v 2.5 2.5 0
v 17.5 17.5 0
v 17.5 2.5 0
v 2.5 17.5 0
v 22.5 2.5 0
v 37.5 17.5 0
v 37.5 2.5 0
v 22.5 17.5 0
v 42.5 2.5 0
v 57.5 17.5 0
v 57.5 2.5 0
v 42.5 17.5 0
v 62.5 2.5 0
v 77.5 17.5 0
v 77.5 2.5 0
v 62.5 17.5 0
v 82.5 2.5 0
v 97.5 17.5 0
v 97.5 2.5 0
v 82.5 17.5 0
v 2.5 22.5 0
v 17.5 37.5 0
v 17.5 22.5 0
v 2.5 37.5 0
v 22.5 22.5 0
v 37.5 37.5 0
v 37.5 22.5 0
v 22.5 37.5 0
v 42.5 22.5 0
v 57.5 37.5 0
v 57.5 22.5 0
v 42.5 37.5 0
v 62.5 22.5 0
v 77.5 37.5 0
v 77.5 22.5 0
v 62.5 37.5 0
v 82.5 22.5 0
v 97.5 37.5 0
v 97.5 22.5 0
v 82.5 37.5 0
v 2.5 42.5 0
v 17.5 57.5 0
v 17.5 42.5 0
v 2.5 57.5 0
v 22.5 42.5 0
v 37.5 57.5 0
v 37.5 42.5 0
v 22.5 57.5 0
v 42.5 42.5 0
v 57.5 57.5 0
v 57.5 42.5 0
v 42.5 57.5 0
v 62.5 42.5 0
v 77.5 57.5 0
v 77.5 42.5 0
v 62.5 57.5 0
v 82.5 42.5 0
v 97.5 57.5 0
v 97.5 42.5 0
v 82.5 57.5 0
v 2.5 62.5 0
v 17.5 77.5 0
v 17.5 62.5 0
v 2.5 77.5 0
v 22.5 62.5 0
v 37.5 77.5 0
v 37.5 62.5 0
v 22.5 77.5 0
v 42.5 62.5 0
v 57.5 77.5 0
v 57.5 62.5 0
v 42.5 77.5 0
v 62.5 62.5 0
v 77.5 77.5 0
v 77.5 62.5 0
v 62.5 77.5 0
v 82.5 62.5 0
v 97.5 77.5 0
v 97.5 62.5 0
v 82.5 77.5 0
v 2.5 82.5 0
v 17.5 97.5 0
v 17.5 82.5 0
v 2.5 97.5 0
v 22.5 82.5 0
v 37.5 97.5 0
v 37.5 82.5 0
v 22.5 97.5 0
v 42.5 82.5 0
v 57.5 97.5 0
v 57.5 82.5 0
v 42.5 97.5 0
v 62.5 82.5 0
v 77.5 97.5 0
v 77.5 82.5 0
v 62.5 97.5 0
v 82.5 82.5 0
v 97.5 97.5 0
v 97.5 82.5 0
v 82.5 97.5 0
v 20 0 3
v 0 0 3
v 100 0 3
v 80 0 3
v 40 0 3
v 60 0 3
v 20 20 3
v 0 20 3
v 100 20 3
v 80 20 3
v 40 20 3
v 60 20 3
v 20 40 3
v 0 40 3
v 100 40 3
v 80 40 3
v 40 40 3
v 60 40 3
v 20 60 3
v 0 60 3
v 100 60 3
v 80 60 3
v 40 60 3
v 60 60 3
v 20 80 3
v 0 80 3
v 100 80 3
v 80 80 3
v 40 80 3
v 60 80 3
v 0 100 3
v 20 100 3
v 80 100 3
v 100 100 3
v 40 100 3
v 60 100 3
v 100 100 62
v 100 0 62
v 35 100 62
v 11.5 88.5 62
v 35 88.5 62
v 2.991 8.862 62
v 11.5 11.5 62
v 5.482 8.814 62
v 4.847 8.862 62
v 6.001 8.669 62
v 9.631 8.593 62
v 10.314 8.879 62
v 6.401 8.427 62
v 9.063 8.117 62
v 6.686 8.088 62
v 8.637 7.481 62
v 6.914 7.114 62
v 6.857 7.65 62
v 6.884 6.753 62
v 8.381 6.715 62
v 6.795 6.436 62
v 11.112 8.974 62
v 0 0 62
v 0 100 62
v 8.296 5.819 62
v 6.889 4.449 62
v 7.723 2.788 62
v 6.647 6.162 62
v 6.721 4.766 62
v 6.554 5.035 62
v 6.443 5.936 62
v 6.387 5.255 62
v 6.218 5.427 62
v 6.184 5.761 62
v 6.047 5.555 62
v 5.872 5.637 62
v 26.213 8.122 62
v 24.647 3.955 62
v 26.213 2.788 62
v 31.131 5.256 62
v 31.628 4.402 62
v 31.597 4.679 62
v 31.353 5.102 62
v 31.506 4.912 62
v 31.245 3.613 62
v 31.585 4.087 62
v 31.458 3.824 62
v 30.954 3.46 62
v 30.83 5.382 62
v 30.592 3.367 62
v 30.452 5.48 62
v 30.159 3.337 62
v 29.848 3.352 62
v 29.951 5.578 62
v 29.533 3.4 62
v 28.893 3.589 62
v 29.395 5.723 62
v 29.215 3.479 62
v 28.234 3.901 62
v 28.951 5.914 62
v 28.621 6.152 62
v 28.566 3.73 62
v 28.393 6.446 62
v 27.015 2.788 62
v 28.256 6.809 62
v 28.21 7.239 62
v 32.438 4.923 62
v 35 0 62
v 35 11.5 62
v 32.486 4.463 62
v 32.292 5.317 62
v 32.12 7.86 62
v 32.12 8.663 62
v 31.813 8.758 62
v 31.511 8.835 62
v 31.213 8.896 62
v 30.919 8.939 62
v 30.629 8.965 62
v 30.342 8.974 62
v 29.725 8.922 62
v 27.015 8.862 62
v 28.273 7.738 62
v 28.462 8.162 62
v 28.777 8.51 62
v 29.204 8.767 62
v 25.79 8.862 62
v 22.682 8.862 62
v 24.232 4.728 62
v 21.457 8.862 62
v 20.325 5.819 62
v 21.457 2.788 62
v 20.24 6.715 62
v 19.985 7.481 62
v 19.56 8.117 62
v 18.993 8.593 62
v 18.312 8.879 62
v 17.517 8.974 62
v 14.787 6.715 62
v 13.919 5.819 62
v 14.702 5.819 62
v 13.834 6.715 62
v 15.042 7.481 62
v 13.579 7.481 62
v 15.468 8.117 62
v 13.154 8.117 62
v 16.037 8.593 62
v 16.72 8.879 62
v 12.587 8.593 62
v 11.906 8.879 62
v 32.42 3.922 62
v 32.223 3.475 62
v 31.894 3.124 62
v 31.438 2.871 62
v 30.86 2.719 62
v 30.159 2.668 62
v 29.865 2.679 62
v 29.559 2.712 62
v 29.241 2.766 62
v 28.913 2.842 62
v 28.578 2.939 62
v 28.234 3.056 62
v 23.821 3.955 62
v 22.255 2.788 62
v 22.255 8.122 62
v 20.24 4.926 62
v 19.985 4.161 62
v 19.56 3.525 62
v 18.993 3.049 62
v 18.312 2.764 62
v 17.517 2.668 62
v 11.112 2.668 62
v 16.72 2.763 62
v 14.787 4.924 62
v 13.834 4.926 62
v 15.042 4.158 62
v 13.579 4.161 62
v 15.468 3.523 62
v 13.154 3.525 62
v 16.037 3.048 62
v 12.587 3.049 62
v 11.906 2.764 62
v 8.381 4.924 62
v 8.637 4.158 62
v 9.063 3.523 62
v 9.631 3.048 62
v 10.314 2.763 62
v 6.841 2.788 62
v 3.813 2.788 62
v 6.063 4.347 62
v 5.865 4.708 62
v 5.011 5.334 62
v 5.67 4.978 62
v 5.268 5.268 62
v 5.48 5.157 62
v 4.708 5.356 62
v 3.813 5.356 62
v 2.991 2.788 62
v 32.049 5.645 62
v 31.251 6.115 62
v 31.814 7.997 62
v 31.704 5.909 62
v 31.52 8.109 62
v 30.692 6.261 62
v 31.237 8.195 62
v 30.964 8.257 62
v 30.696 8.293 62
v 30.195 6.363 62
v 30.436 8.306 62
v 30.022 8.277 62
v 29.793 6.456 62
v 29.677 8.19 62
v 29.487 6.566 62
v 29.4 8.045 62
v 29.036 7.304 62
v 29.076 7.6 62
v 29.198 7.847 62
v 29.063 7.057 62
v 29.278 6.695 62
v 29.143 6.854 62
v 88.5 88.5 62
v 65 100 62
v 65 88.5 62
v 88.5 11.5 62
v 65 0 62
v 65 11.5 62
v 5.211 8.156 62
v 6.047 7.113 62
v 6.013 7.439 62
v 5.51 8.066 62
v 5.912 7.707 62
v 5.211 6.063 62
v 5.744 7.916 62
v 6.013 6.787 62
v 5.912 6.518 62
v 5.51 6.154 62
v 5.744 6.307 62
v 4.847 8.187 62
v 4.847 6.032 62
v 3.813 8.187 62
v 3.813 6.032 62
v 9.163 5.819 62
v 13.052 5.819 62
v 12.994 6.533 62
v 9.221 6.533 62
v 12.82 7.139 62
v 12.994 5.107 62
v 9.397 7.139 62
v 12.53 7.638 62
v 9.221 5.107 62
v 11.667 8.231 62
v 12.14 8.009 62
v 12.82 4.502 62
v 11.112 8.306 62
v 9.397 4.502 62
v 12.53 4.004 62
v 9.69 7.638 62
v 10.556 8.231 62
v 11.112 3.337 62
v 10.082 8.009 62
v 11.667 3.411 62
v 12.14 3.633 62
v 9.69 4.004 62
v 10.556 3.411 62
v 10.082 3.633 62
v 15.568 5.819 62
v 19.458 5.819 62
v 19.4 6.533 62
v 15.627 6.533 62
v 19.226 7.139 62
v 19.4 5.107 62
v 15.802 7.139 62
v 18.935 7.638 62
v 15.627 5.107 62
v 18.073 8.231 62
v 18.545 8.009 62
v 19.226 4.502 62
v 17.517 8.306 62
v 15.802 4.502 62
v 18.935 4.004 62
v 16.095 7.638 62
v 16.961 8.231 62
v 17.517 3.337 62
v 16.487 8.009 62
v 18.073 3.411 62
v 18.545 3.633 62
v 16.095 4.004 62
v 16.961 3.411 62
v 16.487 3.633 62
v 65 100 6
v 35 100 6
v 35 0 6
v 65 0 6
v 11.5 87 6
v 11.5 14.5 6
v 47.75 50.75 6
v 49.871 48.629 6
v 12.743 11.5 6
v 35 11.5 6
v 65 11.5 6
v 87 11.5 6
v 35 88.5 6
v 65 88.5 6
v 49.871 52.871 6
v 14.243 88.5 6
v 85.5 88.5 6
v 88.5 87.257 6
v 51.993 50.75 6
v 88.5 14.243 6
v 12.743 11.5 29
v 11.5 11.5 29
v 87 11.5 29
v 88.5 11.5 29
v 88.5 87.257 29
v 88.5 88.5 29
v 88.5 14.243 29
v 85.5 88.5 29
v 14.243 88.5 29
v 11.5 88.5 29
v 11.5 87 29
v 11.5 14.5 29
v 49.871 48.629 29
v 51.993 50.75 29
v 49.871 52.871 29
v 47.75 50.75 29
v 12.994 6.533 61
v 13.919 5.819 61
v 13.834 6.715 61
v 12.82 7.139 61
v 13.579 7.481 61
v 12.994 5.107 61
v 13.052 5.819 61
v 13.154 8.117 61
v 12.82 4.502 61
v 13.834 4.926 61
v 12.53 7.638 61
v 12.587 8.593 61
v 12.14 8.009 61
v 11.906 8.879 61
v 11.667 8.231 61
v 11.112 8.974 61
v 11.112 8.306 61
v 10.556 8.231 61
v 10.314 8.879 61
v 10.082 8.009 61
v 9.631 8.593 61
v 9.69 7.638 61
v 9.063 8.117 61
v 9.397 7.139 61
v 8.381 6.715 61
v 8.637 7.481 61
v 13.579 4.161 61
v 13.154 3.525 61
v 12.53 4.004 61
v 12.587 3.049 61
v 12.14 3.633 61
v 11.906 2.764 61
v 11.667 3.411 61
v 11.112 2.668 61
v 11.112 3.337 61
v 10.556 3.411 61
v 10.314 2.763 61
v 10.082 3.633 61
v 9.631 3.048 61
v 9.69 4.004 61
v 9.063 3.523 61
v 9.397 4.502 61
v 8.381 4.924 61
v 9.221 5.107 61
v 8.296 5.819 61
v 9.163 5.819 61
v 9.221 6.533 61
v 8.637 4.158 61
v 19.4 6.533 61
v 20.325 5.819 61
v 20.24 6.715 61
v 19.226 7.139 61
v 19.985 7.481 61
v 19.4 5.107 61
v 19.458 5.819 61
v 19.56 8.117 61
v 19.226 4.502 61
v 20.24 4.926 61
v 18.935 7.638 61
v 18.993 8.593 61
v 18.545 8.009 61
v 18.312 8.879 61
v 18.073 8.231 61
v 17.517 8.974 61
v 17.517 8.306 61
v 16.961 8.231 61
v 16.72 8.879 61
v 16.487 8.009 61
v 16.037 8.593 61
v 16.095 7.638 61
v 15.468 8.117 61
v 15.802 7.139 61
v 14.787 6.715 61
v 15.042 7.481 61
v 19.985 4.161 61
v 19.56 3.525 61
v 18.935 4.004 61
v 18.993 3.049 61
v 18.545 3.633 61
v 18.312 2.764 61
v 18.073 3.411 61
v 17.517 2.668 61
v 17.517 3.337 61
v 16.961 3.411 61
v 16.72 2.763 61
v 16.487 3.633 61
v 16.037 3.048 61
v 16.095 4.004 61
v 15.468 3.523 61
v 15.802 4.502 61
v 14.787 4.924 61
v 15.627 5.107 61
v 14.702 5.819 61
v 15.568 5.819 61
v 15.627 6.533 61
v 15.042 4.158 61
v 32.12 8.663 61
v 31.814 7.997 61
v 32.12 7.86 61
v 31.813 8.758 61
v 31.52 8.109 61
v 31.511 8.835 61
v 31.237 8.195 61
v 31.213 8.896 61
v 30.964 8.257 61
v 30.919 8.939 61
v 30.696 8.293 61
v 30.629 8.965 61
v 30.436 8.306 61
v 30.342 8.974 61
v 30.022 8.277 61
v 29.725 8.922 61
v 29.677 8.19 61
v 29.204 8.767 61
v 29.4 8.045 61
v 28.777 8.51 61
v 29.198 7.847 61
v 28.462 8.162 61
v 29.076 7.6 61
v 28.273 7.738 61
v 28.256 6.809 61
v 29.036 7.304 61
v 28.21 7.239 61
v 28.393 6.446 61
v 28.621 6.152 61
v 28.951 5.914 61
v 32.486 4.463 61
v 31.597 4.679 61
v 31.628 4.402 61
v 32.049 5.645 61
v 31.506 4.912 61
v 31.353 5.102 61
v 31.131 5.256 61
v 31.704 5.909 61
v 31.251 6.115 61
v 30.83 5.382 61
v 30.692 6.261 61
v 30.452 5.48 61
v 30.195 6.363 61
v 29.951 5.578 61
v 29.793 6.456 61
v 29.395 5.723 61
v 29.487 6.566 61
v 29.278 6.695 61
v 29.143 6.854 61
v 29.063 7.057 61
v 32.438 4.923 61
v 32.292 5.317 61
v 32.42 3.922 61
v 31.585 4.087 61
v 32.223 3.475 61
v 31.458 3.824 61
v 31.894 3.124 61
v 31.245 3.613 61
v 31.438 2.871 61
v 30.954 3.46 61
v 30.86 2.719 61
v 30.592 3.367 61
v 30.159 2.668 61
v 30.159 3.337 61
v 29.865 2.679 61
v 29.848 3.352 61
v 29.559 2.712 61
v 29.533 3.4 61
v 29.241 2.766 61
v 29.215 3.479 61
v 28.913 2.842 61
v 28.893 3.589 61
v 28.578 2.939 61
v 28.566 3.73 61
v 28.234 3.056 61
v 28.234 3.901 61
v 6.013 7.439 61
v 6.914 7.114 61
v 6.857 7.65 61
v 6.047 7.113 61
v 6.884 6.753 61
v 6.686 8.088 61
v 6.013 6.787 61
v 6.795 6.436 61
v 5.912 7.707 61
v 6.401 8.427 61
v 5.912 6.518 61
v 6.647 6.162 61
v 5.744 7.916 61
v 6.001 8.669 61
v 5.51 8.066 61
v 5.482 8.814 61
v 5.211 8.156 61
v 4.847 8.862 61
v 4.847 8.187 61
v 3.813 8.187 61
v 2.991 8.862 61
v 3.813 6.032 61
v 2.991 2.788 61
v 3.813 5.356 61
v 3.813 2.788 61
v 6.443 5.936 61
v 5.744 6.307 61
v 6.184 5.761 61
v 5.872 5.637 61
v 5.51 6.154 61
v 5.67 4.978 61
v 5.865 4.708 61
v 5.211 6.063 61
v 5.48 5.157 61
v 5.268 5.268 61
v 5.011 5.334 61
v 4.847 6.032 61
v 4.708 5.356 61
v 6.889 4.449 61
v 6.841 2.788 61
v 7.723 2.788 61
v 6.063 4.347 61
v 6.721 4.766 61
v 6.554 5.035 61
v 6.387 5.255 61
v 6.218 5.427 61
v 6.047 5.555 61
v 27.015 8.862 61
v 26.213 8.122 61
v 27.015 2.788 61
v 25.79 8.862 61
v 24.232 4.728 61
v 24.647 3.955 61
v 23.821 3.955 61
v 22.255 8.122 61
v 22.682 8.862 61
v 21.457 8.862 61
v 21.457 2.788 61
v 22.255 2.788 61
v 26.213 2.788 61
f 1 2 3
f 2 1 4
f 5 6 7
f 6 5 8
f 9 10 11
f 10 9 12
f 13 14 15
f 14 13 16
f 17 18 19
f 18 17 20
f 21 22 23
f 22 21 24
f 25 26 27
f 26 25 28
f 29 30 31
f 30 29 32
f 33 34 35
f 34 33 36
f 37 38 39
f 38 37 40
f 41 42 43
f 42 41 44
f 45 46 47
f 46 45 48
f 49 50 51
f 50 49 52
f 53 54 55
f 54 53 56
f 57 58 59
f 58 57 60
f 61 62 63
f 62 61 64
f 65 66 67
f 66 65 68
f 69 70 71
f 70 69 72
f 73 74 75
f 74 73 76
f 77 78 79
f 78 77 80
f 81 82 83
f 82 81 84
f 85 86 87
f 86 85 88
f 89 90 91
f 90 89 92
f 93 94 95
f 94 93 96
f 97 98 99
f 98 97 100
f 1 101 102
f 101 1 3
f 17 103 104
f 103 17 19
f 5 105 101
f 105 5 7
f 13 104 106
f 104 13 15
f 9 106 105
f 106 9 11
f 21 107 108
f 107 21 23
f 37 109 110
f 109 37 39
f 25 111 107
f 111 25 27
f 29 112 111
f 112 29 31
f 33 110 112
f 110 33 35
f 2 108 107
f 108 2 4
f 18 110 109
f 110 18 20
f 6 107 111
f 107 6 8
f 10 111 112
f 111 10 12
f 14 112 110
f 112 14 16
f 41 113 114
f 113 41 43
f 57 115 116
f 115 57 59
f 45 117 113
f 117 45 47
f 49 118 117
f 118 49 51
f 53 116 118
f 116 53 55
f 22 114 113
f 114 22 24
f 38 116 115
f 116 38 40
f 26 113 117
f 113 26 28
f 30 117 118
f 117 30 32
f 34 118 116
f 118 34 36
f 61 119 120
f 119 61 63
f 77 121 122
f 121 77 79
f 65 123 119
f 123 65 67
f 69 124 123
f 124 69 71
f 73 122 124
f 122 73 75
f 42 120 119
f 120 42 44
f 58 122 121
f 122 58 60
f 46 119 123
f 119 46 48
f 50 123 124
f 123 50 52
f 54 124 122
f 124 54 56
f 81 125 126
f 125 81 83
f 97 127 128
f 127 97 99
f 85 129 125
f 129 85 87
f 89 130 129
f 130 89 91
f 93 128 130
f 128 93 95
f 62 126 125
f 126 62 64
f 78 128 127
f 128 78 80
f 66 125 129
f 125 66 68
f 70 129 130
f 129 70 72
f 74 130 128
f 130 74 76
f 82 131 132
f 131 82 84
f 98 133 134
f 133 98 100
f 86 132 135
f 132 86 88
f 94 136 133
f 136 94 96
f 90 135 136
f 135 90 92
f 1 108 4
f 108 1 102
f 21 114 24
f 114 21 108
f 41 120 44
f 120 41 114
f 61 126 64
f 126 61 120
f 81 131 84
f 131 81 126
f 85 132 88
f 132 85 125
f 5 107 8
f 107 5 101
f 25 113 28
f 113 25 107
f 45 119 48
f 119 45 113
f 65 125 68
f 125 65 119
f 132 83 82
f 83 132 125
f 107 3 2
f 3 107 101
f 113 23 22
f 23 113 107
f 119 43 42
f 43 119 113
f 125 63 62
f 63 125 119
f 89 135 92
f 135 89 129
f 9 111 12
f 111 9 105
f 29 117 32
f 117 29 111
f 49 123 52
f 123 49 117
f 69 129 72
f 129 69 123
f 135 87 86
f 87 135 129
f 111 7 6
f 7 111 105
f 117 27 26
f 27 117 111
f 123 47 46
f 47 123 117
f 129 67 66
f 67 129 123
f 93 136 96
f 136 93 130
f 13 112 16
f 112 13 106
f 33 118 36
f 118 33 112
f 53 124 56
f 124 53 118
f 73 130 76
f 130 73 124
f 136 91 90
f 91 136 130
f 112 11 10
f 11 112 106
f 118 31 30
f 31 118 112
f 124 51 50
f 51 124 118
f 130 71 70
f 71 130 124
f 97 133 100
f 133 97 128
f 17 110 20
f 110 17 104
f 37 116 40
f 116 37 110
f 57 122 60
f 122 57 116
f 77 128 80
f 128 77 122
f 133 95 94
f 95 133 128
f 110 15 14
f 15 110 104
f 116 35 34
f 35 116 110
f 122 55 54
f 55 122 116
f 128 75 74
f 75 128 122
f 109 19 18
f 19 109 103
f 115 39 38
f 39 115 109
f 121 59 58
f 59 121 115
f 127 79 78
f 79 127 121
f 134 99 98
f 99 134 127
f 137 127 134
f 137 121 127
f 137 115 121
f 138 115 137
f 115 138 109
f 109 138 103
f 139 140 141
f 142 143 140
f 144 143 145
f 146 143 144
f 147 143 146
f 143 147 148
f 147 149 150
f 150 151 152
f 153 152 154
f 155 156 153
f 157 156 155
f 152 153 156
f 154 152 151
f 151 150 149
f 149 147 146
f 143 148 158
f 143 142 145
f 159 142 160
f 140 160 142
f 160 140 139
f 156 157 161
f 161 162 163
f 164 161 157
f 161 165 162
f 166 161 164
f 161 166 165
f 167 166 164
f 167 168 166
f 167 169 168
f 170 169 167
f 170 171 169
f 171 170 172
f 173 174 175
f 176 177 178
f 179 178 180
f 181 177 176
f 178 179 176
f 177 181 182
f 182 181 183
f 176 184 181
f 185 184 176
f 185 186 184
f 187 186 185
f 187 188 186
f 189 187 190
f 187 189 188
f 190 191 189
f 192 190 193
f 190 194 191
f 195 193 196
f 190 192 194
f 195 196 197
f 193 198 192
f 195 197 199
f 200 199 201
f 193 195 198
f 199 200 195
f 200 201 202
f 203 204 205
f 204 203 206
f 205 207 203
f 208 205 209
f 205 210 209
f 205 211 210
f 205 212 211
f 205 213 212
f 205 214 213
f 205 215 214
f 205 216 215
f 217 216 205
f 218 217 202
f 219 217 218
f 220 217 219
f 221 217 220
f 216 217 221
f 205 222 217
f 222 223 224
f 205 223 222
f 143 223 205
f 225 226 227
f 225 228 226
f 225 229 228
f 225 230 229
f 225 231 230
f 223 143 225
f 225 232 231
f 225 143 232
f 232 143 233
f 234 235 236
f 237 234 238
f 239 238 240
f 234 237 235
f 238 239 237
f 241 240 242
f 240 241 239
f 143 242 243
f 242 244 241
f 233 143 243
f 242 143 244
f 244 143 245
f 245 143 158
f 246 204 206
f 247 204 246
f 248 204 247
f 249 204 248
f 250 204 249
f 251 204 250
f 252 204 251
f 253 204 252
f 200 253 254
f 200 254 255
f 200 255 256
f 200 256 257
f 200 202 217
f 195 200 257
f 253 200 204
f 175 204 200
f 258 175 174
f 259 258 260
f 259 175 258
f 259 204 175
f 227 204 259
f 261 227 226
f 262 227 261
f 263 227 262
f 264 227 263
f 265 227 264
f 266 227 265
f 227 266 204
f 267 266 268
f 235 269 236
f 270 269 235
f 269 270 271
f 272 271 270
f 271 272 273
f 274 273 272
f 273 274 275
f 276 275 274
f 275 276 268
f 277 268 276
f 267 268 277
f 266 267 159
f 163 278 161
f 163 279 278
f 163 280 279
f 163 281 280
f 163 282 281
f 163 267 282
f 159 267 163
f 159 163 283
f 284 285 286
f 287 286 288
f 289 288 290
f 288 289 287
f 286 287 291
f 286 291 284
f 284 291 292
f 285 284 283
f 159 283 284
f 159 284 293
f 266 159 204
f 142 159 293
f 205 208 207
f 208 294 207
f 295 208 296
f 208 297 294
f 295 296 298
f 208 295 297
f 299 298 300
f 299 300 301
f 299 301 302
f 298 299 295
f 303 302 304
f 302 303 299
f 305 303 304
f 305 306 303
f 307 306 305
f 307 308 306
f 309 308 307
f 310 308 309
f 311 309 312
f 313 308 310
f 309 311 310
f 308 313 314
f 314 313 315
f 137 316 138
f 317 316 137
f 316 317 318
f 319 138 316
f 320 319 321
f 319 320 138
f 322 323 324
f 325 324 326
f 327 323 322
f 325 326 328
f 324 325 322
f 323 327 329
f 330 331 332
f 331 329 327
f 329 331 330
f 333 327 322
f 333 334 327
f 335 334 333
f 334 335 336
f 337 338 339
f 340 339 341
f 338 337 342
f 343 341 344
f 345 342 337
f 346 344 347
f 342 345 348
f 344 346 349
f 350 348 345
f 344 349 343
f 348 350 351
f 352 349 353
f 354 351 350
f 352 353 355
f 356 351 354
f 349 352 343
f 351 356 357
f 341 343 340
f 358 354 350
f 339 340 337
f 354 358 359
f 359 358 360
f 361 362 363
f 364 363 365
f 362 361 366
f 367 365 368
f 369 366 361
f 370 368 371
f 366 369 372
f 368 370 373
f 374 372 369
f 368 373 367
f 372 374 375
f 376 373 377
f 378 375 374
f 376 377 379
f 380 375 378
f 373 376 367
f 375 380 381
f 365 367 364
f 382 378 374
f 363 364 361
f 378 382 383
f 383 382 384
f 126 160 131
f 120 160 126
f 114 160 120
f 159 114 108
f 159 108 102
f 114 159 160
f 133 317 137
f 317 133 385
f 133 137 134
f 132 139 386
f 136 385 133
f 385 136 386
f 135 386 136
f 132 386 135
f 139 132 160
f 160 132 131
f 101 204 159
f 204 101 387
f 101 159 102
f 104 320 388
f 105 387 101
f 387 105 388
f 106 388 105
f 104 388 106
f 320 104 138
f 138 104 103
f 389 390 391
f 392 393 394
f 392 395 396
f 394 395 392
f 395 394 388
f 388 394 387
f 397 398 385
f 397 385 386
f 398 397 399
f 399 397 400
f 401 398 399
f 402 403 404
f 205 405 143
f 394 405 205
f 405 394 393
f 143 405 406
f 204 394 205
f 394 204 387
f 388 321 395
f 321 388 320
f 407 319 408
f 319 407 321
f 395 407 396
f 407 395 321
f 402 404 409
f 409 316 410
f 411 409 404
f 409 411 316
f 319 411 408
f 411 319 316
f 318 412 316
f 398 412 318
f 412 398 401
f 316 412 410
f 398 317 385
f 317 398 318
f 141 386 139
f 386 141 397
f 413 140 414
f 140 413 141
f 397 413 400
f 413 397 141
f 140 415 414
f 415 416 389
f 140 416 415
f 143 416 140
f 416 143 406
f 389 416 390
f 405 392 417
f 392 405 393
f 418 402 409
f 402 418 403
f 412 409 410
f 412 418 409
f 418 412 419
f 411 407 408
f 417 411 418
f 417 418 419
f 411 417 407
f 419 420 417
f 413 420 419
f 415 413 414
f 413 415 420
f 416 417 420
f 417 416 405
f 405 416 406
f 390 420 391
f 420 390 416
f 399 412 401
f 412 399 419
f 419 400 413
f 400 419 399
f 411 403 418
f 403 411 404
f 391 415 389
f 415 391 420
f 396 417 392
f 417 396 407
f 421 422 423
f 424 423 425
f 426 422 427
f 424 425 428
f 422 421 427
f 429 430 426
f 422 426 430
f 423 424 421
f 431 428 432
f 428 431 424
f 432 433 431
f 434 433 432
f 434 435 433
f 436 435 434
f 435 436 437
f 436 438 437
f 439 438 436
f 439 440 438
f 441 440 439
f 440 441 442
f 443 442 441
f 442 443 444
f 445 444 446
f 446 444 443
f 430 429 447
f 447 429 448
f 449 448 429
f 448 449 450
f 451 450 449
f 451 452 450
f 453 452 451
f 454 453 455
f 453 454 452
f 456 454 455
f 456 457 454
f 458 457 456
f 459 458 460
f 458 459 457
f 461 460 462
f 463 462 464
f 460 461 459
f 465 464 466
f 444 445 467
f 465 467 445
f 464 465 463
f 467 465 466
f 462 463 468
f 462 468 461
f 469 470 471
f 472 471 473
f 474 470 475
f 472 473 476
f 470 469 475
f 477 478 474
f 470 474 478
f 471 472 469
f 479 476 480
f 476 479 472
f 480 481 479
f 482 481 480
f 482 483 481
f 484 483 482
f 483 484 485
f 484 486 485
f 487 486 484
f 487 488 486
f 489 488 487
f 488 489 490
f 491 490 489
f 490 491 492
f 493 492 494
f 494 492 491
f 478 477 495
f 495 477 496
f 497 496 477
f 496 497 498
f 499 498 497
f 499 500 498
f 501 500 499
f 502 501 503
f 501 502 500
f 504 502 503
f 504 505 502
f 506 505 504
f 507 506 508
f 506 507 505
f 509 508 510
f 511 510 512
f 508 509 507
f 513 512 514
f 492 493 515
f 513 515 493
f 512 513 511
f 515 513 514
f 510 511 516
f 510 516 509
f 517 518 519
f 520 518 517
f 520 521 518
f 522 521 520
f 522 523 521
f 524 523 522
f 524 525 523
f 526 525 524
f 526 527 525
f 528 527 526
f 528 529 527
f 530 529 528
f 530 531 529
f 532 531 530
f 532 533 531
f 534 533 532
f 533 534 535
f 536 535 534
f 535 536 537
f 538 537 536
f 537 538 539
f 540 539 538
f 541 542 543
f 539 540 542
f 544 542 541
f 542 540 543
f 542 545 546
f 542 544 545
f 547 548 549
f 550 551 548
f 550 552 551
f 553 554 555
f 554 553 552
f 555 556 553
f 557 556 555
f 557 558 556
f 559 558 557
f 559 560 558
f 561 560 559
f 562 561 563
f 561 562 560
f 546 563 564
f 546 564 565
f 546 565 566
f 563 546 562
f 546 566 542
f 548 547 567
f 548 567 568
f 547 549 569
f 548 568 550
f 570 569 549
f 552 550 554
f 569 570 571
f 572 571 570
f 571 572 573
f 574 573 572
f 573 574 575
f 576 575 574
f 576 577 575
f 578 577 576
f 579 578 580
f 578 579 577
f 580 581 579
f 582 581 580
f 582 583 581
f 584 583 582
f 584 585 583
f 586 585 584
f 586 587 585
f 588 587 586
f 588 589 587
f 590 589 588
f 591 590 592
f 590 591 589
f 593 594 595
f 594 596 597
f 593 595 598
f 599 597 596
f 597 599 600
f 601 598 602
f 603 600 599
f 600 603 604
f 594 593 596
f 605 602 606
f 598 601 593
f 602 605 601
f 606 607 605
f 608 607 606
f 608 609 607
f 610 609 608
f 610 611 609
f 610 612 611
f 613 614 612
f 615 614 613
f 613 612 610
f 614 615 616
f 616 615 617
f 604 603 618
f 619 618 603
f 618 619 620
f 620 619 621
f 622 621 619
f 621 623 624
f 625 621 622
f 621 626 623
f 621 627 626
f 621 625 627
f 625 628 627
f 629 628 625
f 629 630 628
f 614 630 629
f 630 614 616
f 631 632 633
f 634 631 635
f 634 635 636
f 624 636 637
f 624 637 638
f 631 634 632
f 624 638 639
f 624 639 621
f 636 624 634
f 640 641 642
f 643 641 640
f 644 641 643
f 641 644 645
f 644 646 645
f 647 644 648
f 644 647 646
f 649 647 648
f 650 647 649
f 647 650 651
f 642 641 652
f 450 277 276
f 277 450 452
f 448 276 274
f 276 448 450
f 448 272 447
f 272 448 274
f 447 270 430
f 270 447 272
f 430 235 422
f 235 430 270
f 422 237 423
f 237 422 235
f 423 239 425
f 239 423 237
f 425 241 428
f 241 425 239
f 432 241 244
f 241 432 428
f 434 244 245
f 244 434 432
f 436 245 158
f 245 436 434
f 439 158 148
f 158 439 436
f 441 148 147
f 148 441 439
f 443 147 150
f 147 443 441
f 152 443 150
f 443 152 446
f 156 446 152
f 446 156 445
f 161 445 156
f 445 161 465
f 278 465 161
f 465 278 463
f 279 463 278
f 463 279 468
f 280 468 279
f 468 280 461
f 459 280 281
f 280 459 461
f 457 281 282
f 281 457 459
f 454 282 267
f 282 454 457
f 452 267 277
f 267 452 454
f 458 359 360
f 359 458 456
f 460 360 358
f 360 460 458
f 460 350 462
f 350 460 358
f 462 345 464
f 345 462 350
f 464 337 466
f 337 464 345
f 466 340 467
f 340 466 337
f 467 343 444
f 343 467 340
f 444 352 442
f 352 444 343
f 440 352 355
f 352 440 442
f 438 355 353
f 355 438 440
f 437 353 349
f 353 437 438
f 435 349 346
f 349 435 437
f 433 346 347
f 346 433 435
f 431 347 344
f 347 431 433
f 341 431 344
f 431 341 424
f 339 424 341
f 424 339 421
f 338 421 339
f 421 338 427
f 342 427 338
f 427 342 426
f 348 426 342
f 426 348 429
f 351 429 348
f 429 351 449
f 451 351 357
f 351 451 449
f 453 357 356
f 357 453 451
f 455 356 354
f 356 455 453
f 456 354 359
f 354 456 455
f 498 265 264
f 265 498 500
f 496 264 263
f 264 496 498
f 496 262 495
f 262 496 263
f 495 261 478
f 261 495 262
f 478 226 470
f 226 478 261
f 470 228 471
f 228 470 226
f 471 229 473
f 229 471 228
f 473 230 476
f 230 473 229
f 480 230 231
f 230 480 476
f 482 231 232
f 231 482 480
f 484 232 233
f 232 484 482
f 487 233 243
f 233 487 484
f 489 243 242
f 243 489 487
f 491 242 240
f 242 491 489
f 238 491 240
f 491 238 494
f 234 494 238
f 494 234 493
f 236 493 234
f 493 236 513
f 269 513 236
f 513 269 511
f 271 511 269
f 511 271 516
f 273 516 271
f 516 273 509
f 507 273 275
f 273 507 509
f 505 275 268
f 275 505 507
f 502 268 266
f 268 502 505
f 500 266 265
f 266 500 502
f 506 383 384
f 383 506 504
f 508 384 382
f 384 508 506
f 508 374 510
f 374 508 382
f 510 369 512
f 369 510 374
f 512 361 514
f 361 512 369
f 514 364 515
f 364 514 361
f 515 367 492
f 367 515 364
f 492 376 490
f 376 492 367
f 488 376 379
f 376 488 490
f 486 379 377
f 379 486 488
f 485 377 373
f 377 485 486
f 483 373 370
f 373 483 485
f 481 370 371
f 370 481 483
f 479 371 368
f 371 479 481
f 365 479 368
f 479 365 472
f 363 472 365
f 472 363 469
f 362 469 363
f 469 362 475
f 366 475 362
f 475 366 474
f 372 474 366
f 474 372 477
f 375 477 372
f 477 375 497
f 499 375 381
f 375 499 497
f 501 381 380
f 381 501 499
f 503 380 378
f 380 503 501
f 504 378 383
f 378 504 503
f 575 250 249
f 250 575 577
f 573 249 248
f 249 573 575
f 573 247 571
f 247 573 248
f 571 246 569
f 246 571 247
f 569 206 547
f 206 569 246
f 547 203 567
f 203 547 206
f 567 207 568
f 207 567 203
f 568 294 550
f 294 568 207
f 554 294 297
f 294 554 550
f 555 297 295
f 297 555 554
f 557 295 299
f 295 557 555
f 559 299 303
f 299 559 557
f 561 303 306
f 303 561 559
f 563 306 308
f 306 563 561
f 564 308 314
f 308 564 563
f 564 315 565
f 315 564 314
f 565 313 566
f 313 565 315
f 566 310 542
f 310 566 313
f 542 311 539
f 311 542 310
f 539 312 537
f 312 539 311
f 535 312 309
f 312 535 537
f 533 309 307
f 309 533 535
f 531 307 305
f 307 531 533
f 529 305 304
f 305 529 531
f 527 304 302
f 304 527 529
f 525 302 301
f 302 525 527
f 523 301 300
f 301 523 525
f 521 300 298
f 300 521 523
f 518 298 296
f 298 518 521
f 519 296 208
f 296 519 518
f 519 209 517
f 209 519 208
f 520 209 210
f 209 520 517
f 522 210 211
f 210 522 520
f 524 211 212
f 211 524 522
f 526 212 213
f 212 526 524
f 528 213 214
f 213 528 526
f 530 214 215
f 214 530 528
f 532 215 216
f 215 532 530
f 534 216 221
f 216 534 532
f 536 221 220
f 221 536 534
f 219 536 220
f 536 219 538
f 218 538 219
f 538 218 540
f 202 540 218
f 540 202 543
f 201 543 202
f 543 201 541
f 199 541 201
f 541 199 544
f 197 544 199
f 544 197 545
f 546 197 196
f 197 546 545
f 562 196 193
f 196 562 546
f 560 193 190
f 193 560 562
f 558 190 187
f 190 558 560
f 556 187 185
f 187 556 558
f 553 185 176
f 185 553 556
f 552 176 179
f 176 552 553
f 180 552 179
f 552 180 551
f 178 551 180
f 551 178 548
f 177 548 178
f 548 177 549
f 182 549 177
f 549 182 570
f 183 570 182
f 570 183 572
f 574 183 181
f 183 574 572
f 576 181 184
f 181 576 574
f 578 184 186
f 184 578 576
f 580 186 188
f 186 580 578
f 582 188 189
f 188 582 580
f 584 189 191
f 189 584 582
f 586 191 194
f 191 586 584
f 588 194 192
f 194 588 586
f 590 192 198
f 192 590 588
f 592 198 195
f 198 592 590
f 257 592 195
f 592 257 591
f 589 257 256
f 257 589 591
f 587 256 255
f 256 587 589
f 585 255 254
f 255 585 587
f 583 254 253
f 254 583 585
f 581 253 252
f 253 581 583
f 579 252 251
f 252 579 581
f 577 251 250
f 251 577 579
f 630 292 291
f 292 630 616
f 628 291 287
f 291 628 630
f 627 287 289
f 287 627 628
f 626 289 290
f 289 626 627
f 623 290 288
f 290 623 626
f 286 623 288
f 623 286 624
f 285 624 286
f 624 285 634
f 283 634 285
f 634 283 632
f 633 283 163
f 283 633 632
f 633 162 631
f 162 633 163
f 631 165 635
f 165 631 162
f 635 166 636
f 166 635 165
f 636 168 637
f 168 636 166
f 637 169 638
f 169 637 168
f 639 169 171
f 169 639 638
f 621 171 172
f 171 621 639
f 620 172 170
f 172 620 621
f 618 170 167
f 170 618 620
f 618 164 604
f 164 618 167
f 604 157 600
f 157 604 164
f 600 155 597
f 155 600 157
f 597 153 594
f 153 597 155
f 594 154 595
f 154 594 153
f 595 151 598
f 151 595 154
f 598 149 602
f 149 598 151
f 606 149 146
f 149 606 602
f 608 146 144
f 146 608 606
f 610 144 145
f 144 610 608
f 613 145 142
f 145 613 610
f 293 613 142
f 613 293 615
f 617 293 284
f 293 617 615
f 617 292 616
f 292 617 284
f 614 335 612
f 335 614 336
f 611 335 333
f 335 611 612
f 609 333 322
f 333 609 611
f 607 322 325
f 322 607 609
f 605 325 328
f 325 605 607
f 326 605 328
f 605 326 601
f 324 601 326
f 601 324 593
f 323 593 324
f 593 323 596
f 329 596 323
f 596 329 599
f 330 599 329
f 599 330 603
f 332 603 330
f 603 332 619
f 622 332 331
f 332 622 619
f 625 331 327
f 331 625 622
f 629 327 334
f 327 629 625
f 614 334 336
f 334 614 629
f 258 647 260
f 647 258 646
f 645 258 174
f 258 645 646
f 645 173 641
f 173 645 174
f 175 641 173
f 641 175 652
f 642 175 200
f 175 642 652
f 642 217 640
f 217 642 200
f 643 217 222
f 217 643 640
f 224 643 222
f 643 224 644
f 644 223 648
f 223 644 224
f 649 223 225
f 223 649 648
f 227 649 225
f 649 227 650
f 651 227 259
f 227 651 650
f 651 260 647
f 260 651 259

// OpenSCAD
// file: ../chip_holder.scad
use <common.scad>

MAX_THUMB_WIDTH = 30;
WAY_DEEP = 100;

render_helper = 1;

module generate_holder(
    tile_columns = 4,
    tile_rows = 2,
    tile_width = 33,
    tile_depth = 33,
    tile_count = 20,
    tile_height = 1.75,
    wall_width = 3,
    box_height = 69,
    box_clearence = 15.75,
    round_to_full_base = true,
    fit_to_box_height = true,
    hollow_bottom = false,
    include_grid = true
) {
    function getSize(count, tile_size) = count * (tile_size + wall_width) + wall_width;
    function roundFullBase(count, tile_size) = (round_to_full_base) ? ceil(getSize(count, tile_size) / base_tile_size()) * base_tile_size() : getSize(count, tile_size);
    function max_height() = box_height - box_clearence;

    slot_height = tile_count * tile_height;
    min_floor_offset = min_floor_offset(wall_width);
    min_height = slot_height + min_floor_offset;
    total_height = (fit_to_box_height) ? max(max_height(), min_height) : min_height;
    inside_height = (hollow_bottom) ? total_height - min_floor_offset : slot_height;
    floor_offset = (fit_to_box_height) ? max_height() - inside_height : min_floor_offset;

    total_width = roundFullBase(tile_columns, tile_width);
    total_depth = roundFullBase(tile_rows, tile_depth);

    row_width = tile_depth * tile_rows;
    col_width = tile_width * tile_columns;
    outside_walls = wall_width * 2;

    col_spread = (tile_columns > 1) ? (total_width - col_width - outside_walls) / (tile_columns - 1) : 0;
    row_spread = (tile_rows > 1) ? (total_depth - row_width - outside_walls) / (tile_rows - 1) : 0;
    
    thumb_width = min(tile_width - (wall_width * 2), MAX_THUMB_WIDTH);

    function colOffset(i) = (tile_columns == 1) ?
        (total_width - tile_width) / 2 :
        wall_width + ((tile_width + col_spread) * i);
    function rowOffset(i) = (tile_rows == 1) ?
        (total_depth - tile_depth) / 2 :
        wall_width + ((tile_depth + row_spread) * i);

    module tile_slot() {
        translate([0, 0, 0])
        square([tile_width, tile_depth]);
    }

    module thumb_slot_front() {
        width = thumb_width;
        side_offset = (tile_width - width) / 2;
        translate([side_offset, -WAY_DEEP, 0])
        square([width, WAY_DEEP]);
    }

    module thumb_slot_back() {
        width = thumb_width;
        side_offset = (tile_width - width) / 2;
        translate([side_offset, tile_depth, 0])
        square([width, WAY_DEEP]);
    }

    module tile_hole(slot_type = "none") {
        box_bottom = floor_offset;
        translate([0, 0, box_bottom])
        linear_extrude(height = inside_height + render_helper)
        union() {
            tile_slot();
            if (slot_type == "front" || slot_type == "both") {
                thumb_slot_front();
            }

            if (slot_type == "back" || slot_type == "both") {
                thumb_slot_back();
            }
        }
    }

    module tile_holes() {
        for (i = [0 : tile_rows - 1]) {
            for (j = [0 : tile_columns - 1]) {
                slot_type = (tile_rows == 1) ? "both" : (i == 0) ? "front" : (i == tile_rows - 1) ? "back" : "none";
                col_offset = colOffset(j);
                row_offset = rowOffset(i);

                translate([col_offset, row_offset, 0])
                tile_hole(slot_type = slot_type);
            }
        }
    }

    module bottom_x() {
        if (hollow_bottom) {
            for (i = [0 : tile_rows - 1]) {
                for (j = [0 : tile_columns - 1]) {
                    length = sqrt(pow(tile_width, 2) + pow(tile_depth, 2));
                    rot = acos(tile_depth / length);
                    x_height = inside_height - slot_height;
                    z_offset = min_floor_offset(wall_width);

                    col_offset = colOffset(j);
                    row_offset = rowOffset(i);

                    translate([col_offset - wall_width / 2, row_offset + wall_width / 2, z_offset])
                    rotate([0, 0, -rot])
                    cube([wall_width, length + wall_width, x_height]);

                    translate([col_offset + tile_width, row_offset - wall_width / 2, z_offset])
                    rotate([0, 0, rot])
                    cube([wall_width, length + wall_width, x_height]);
                }
            }
        }
    }

    difference() {
        union() {
            difference() {
                base_block(total_width, total_depth, total_height, include_grid = include_grid);
                tile_holes();
            }
            bottom_x();
        }

        if ($children) {
            text_offset_x = (colOffset(0) + (tile_width - thumb_width) / 2) / 2;
            text_offset_y = rowOffset(0) / 2;
            
            translate([text_offset_x, text_offset_y, total_height])
            children(0);
        }
    }
}
// file: common.scad
WALL_WIDTH = 3;
BOX_HEIGHT = 75;
BOX_CLEARENCE = 13;
TILE_HEIGHT = 1.75;

FONT_SIZE = 8;

function wall_width() = WALL_WIDTH;
function box_height() = BOX_HEIGHT;
function box_clearence() = BOX_CLEARENCE;
function tile_height() = TILE_HEIGHT;
function font_size() = FONT_SIZE;
// file: ../common.scad
BASE_TILE_SIZE=20;
BASE_WIDTH=5;
PEAK_HEIGHT=3;

DEFAULT_FONT = "Ubuntu:style=Medium";
DEFAULT_FONT_DEPTH = 1;
DEFAULT_FONT_SIZE = 10;

render_helper_h = 1;

function y_up() = [90, 0, 0];
function x_up() = [90, 0, 90];

function min_floor_offset(wall_width) = wall_width + PEAK_HEIGHT;
function tri_mid() = BASE_WIDTH / 2;
function triangle() = [[0, 0],[BASE_WIDTH, 0],[tri_mid(), PEAK_HEIGHT]];
function base_tile_size() = BASE_TILE_SIZE;
function peak_height() = PEAK_HEIGHT;
function font_depth() = DEFAULT_FONT_DEPTH;
function font_size() = DEFAULT_FONT_SIZE;

function isX(direction) = (direction == "x");

module grid(width, depth, direction) {
    length = isX(direction) ? width : depth;
    slot_length = isX(direction) ? depth : width;
    translate_z = isX(direction) ? -slot_length : 0;
    rot = isX(direction) ? y_up() : x_up();

    // This is the total additional slots past the initial one
    total_slots = floor(length / BASE_TILE_SIZE);

    for (i = [0 : total_slots]) {
        offset = -tri_mid() + BASE_TILE_SIZE * i;
        rotate(rot)
        translate([offset, 0, translate_z])
        linear_extrude(height = slot_length)
        polygon(points=triangle());
    }
}

module grid_slots(width, depth) {
    grid(width, depth, "y");
    grid(width, depth, "x");
}

module base_block(width, depth, height, include_grid = true) {
    difference() {
        cube([width, depth, height]);

        if (include_grid) {
            grid_slots(width, depth);
        }
    }
}

module prism(l, w, h) {
    polyhedron(
        points=[ [0, 0, 0], [0, w, h], [l, w, h], [l, 0, 0], [0, w, 0], [l, w, 0] ],
        faces=[ [0, 1, 2, 3],
            [2, 1, 4, 5],
            [0, 3, 5, 4],
            [0, 4, 1],
            [3, 2, 5]
        ]
    );
}

module pyramid(w) {
    polyhedron(
        points=[ [w,w,0],[w,-w,0],[-w,-w,0],[-w,w,0], [0,0,w]  ],
        faces=[ [0,1,4],[1,2,4],[2,3,4],[3,0,4], [1,0,3],[2,1,3] ]
    );
}

module embossed_text(
    t,
    h = DEFAULT_FONT_DEPTH,
    font = DEFAULT_FONT,
    size = DEFAULT_FONT_SIZE,
    valign = "center",
    halign = "center",
    render_helper = true
) {
    extrude_h = (render_helper) ? h + render_helper_h : h;
    
    translate([0, 0, -h])
    linear_extrude(extrude_h)
    text(
        t,
        font = font,
        size = size,
        valign = valign,
        halign = halign
    );
}
// main file
use <../common.scad>
use <common.scad>
use <../chip_holder.scad>

HOLLOW_BOTTOM = true;

module room_holder(hollow_bottom = true) {
    generate_holder(
        tile_columns = 1,
        tile_rows = 1,
        tile_width = 77,
        tile_depth = 77,
        tile_count = 22,
        tile_height = 1.5,
        wall_width = wall_width(),
        box_height = box_height(),
        box_clearence = box_clearence(),
        round_to_full_base = true,
        fit_to_box_height = true,
        hollow_bottom = hollow_bottom
    ) {
        embossed_text(
            "ROOMS",
            h = font_depth(),
            size = font_size() - 2
        );
    }
}

room_holder(HOLLOW_BOTTOM);
